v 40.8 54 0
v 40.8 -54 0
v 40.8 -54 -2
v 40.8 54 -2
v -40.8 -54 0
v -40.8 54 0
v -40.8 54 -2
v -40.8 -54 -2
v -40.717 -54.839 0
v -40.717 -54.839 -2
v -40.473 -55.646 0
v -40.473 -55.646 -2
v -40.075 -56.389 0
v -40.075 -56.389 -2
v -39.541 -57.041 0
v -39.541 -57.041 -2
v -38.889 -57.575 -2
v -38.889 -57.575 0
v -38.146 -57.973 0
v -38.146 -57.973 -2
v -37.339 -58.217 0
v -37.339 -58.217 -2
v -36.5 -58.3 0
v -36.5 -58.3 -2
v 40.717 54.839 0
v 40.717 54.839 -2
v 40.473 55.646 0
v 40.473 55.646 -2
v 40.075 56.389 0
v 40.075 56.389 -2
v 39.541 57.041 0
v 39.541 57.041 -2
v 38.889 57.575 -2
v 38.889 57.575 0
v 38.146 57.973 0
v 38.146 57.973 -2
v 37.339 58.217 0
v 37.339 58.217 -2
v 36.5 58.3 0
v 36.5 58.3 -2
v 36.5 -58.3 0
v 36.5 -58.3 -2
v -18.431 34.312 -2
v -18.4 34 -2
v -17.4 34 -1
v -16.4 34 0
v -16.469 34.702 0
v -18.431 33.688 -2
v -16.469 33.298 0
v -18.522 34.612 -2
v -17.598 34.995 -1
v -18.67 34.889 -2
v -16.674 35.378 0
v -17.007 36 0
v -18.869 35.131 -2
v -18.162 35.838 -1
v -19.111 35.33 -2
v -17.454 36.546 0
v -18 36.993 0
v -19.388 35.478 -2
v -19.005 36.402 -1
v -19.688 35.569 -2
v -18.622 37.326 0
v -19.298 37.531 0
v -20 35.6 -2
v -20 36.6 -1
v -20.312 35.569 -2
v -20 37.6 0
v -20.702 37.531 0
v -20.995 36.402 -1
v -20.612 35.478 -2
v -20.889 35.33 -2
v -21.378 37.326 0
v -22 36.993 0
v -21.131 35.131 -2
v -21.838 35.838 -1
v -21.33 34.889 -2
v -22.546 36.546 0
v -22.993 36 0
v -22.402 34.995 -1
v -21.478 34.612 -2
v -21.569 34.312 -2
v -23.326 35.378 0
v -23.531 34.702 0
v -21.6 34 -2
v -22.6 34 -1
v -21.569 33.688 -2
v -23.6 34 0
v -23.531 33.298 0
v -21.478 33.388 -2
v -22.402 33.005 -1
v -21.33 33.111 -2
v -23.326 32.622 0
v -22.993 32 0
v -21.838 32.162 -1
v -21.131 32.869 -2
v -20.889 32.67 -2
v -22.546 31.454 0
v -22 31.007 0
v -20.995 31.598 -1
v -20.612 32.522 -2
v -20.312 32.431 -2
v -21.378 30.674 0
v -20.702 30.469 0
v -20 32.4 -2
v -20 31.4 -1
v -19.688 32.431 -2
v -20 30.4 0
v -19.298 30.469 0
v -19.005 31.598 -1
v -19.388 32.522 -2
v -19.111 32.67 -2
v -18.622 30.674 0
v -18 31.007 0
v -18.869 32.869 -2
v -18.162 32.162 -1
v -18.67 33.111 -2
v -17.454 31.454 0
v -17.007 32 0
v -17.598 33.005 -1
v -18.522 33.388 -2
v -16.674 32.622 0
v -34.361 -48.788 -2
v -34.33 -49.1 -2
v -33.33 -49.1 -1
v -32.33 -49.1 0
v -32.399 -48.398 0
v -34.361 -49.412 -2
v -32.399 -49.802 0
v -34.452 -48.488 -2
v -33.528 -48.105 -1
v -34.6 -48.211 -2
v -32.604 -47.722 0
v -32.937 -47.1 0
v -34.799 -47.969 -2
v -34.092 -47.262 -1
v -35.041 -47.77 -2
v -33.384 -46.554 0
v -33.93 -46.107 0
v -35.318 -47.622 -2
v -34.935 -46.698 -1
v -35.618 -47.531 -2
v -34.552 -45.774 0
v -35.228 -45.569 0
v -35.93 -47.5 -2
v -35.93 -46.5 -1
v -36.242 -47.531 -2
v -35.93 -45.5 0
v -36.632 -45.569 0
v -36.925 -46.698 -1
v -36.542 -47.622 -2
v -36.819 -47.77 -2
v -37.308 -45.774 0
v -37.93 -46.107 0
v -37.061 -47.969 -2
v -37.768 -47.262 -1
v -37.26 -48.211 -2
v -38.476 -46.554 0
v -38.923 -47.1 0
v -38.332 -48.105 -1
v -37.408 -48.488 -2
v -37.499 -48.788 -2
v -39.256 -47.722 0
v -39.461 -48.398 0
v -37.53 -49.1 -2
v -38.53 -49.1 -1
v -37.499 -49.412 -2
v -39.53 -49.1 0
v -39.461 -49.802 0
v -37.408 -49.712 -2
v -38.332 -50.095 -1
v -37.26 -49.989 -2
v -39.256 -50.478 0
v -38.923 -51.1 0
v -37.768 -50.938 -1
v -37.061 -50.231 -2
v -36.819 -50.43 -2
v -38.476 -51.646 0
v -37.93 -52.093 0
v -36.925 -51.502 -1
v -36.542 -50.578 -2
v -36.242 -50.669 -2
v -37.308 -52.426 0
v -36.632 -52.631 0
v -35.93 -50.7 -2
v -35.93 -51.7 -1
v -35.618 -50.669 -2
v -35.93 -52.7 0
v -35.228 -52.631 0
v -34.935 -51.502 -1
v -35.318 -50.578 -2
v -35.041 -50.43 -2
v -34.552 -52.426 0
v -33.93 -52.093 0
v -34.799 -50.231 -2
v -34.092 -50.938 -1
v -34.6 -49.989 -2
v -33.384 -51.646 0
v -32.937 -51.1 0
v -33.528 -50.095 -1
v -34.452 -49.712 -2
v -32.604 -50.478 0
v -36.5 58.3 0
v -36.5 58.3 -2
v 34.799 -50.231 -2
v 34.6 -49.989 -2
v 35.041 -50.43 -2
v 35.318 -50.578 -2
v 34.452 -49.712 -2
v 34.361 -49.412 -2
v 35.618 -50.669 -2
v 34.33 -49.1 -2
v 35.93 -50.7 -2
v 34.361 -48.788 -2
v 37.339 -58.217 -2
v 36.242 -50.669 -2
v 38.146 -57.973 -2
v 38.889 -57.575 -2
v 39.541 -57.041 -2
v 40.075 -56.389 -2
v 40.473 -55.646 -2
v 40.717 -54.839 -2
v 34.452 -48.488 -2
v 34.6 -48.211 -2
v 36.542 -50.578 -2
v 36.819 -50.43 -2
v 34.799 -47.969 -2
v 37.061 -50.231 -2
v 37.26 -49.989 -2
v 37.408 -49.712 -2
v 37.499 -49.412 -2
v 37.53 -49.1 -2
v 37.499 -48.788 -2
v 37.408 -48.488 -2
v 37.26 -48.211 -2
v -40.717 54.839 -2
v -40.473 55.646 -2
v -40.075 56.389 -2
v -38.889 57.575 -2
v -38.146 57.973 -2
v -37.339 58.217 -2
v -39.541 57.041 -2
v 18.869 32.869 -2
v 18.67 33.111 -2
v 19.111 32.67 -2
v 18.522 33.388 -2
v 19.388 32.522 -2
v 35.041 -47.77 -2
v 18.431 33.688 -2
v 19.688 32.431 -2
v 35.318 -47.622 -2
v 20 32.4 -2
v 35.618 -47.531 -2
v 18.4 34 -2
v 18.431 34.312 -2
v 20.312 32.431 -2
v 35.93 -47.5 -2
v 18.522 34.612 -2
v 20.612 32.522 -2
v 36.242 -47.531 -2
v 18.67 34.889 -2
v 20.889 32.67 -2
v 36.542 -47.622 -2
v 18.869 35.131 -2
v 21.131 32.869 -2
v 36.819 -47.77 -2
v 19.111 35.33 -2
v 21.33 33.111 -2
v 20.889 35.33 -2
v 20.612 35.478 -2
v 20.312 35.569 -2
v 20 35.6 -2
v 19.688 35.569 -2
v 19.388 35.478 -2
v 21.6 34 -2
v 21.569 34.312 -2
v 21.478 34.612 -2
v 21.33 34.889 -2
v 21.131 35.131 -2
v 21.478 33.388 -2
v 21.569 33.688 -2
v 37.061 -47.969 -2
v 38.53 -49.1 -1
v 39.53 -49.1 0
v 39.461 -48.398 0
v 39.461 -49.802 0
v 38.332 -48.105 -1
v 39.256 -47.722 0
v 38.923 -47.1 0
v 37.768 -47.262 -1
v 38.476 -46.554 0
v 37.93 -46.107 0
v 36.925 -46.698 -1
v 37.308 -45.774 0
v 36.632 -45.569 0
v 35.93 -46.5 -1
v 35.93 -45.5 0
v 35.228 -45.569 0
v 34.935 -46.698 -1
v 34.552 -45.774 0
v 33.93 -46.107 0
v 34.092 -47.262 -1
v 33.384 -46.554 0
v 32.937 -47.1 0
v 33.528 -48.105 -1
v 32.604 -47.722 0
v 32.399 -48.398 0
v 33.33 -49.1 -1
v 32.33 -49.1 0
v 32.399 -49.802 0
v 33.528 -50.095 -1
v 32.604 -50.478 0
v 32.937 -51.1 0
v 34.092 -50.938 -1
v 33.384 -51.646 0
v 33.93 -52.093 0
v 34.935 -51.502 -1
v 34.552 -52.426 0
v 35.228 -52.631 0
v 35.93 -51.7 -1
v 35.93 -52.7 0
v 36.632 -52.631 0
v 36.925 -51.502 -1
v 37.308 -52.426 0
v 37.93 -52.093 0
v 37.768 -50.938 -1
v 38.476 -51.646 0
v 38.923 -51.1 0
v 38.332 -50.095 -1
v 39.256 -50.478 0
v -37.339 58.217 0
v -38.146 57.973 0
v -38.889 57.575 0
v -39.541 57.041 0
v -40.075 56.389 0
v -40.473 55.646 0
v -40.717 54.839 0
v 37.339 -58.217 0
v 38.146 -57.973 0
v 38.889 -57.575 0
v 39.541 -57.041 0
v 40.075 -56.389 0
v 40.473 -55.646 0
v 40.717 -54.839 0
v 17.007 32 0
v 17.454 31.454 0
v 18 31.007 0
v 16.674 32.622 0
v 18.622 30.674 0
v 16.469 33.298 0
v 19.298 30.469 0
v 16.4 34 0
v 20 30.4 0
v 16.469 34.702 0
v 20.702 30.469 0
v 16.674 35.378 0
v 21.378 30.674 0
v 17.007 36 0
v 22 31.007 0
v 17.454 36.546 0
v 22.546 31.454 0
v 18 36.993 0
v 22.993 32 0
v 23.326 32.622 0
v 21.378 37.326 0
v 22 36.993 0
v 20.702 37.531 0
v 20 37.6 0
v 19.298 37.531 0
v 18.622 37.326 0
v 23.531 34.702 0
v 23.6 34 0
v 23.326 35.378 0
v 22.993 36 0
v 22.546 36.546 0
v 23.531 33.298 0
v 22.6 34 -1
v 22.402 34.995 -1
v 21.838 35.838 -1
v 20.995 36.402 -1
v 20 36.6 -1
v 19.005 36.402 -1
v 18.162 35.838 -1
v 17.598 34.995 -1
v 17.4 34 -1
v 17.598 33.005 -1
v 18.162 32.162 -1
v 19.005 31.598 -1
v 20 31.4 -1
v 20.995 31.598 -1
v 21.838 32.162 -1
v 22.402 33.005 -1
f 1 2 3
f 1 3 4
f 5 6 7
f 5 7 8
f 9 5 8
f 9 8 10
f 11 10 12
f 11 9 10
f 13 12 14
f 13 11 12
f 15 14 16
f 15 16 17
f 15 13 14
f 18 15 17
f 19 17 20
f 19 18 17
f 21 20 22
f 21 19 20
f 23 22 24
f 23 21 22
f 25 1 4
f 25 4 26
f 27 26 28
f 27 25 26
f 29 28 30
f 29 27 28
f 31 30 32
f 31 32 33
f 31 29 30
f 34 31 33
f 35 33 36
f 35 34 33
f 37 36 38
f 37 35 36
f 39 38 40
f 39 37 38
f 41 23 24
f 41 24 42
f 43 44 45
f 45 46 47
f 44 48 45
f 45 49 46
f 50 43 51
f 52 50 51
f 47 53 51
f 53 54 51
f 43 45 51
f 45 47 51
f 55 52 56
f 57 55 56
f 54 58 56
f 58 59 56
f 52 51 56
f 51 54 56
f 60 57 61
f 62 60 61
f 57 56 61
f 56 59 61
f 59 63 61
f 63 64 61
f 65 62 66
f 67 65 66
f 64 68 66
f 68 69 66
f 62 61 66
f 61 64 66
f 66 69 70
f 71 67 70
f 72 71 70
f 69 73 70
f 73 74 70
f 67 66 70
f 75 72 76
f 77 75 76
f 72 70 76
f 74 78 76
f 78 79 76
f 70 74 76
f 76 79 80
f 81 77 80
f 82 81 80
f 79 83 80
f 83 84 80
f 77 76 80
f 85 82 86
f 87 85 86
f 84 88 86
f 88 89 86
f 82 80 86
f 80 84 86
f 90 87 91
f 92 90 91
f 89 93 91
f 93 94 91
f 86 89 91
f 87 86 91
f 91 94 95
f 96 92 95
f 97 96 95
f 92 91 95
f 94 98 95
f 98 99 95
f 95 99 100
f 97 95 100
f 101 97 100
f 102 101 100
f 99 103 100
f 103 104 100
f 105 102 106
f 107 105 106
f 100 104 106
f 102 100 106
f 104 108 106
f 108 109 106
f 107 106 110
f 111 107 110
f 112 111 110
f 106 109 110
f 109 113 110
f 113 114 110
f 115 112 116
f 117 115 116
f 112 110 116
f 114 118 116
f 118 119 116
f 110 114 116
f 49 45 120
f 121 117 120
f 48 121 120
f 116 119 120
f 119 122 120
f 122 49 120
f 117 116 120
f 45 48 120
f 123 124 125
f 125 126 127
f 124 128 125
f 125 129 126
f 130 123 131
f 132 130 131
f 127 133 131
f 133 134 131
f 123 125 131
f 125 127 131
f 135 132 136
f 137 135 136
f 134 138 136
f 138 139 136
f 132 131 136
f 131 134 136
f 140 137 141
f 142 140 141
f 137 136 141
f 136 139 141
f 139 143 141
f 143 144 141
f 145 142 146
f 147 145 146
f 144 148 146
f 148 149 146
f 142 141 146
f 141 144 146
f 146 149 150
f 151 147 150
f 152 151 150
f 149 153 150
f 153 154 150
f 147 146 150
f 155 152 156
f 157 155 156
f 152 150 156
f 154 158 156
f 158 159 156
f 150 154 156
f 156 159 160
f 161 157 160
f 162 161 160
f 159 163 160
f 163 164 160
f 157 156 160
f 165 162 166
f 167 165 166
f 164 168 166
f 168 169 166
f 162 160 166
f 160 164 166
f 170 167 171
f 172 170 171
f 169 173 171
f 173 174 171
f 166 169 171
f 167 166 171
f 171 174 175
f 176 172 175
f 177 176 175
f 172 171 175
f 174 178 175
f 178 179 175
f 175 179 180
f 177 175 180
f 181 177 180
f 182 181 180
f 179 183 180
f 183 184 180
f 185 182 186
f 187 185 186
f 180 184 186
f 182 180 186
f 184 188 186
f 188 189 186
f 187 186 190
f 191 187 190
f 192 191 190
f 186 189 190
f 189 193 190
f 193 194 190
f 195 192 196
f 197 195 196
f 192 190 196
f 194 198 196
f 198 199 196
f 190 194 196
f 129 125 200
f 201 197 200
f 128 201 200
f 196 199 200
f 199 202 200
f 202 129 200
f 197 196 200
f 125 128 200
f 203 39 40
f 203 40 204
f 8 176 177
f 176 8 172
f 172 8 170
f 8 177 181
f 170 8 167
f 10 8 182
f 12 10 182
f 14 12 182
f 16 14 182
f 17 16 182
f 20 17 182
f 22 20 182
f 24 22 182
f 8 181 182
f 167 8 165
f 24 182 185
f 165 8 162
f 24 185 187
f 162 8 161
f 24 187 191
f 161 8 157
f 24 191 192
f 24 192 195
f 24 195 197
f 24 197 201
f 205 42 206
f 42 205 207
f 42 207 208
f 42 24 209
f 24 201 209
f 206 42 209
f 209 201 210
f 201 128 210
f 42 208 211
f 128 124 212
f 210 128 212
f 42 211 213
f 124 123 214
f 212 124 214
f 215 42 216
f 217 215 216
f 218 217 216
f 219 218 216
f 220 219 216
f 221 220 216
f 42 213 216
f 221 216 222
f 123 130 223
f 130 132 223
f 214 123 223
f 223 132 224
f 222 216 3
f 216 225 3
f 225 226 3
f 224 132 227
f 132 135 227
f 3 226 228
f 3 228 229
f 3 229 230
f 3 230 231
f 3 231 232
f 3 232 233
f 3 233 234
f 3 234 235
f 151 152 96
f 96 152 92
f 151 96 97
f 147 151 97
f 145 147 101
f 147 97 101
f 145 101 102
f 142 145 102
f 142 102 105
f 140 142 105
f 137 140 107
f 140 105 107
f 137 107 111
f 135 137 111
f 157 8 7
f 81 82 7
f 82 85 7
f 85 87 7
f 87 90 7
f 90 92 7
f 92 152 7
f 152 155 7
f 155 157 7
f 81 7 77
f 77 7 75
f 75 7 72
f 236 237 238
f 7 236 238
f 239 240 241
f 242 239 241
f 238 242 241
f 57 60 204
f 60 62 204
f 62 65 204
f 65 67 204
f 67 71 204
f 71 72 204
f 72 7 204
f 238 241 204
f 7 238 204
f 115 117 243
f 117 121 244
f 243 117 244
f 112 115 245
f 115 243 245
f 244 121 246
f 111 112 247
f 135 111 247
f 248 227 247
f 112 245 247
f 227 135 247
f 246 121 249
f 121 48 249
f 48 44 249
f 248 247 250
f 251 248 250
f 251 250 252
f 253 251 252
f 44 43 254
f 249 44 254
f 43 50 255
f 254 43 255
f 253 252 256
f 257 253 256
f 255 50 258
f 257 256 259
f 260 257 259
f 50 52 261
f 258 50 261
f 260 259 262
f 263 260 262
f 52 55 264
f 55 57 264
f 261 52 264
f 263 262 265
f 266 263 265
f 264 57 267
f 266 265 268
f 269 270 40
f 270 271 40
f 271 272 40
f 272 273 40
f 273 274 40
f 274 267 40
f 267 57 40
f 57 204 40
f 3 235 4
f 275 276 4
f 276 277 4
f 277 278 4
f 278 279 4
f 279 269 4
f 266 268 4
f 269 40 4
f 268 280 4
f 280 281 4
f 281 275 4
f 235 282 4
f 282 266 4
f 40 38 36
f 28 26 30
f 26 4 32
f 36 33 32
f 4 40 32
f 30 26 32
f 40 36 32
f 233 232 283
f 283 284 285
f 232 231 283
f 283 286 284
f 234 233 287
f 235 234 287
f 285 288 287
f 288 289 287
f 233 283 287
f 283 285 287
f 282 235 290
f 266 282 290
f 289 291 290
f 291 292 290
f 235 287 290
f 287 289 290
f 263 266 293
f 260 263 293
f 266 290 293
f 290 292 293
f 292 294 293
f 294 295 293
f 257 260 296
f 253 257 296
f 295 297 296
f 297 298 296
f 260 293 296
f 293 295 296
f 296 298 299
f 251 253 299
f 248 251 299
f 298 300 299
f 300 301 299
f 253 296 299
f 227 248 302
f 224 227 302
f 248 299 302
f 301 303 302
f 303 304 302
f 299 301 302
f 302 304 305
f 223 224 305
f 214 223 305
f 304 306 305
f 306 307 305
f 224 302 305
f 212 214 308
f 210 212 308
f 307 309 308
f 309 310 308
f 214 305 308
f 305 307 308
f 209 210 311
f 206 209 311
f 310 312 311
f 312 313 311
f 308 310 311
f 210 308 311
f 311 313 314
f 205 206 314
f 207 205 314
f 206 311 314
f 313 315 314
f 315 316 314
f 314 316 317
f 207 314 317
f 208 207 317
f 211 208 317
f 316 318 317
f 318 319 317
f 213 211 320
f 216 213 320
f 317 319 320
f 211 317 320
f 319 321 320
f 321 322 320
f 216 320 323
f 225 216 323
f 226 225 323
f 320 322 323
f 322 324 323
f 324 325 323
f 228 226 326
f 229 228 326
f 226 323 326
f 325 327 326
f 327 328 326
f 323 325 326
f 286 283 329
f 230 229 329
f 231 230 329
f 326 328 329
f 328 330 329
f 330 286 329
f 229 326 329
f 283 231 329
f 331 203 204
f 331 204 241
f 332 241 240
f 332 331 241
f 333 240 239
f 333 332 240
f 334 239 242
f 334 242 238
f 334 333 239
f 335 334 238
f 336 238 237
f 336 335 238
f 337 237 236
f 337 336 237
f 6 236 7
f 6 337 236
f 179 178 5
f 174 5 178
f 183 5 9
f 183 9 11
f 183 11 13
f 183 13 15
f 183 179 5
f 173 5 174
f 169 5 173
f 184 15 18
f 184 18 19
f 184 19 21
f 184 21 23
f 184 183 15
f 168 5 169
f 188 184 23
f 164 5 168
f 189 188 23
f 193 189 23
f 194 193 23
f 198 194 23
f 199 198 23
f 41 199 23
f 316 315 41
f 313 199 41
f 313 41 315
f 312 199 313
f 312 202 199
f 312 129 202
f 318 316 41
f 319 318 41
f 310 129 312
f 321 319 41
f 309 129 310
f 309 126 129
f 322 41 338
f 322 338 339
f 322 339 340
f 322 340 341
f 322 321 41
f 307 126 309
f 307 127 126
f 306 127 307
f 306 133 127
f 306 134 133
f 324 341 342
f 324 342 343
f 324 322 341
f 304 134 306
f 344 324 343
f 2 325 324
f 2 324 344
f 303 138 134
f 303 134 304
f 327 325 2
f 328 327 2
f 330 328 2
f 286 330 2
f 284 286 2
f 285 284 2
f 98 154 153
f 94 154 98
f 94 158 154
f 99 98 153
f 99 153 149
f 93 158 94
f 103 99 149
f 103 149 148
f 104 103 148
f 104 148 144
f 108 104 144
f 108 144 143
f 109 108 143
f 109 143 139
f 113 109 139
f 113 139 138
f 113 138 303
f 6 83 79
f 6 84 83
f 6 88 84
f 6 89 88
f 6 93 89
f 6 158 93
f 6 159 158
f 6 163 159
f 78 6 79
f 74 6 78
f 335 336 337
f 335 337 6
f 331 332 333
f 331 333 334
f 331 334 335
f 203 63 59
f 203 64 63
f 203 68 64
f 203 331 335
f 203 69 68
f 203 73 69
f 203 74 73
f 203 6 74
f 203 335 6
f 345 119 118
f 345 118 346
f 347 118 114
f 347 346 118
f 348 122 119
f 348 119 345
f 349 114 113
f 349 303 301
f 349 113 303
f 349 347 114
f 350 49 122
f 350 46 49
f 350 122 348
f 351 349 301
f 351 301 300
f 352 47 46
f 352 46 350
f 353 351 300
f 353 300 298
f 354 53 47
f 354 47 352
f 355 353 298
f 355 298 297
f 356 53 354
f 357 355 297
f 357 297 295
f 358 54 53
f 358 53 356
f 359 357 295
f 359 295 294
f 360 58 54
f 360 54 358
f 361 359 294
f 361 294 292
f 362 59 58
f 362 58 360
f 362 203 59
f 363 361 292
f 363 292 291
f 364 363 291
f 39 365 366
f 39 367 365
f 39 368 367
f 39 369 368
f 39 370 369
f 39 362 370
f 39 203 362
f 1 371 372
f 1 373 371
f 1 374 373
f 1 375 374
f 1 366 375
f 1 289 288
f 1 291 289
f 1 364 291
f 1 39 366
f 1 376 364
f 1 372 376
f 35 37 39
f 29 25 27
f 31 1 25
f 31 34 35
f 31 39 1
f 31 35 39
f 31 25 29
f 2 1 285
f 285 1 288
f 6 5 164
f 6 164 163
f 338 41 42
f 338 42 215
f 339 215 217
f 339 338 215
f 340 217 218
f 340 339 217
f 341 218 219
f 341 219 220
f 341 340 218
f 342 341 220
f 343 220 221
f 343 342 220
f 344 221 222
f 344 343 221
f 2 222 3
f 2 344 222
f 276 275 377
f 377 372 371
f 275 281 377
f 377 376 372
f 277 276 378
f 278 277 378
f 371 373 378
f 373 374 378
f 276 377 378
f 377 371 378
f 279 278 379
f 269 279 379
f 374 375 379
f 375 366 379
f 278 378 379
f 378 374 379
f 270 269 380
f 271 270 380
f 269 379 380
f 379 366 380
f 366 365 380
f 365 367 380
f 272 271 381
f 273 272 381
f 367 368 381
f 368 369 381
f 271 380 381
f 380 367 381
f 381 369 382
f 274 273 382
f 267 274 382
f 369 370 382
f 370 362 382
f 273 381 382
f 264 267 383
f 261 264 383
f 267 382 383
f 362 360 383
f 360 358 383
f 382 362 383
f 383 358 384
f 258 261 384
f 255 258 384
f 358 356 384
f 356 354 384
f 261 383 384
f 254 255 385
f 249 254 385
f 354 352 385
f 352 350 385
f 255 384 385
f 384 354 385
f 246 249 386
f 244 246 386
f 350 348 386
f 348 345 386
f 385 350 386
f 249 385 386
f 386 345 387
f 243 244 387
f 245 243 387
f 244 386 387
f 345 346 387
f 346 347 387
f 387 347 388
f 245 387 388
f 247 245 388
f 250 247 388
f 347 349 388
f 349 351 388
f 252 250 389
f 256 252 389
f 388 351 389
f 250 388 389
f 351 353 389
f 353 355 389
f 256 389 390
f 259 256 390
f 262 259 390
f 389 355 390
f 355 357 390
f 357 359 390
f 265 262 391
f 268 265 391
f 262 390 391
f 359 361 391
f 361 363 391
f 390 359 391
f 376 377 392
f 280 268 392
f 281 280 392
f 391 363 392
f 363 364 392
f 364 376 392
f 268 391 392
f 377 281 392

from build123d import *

# Parameters (mm, degrees)
ESQUISSE1_R        = 1.6
BOSS_EXTRU_1_DEPTH = 2
CHANFREIN1_SIZE    = 2


with BuildPart() as part:
    # Esquisse1 → Boss.-Extru.1 (new body)
    with BuildSketch(Plane.XY):
        with BuildLine():
            Line((-36.5, -58.3), (36.5, -58.3))
            ThreePointArc((36.5, -58.3), (39.540559159, -57.040559159), (40.8, -54))
            Line((40.8, -54), (40.8, 54))
            ThreePointArc((40.8, 54), (39.540559159, 57.040559159), (36.5, 58.3))
            Line((36.5, 58.3), (-36.5, 58.3))
            ThreePointArc((-36.5, 58.3), (-39.540559159, 57.040559159), (-40.8, 54))
            Line((-40.8, 54), (-40.8, -54))
            ThreePointArc((-40.8, -54), (-39.540559159, -57.040559159), (-36.5, -58.3))
        make_face()
        with Locations((35.93, -49.1)):
            Circle(ESQUISSE1_R, mode=Mode.SUBTRACT)
        with Locations((-35.93, -49.1)):
            Circle(ESQUISSE1_R, mode=Mode.SUBTRACT)
        with Locations((-20, 34)):
            Circle(ESQUISSE1_R, mode=Mode.SUBTRACT)
        with Locations((20, 34)):
            Circle(ESQUISSE1_R, mode=Mode.SUBTRACT)
    extrude(amount=-BOSS_EXTRU_1_DEPTH)

    # Chanfrein1
    chanfrein1_edges = [part.edges().sort_by_distance(p)[0] for p in [
        (34.33, -49.1, 0),
        (-37.53, -49.1, 0),
        (-21.6, 34, 0),
        (18.4, 34, 0),
    ]]
    chamfer(chanfrein1_edges, length=CHANFREIN1_SIZE - 0.0001)  # a hair under: the kernel refuses the full size


solid = part.part
